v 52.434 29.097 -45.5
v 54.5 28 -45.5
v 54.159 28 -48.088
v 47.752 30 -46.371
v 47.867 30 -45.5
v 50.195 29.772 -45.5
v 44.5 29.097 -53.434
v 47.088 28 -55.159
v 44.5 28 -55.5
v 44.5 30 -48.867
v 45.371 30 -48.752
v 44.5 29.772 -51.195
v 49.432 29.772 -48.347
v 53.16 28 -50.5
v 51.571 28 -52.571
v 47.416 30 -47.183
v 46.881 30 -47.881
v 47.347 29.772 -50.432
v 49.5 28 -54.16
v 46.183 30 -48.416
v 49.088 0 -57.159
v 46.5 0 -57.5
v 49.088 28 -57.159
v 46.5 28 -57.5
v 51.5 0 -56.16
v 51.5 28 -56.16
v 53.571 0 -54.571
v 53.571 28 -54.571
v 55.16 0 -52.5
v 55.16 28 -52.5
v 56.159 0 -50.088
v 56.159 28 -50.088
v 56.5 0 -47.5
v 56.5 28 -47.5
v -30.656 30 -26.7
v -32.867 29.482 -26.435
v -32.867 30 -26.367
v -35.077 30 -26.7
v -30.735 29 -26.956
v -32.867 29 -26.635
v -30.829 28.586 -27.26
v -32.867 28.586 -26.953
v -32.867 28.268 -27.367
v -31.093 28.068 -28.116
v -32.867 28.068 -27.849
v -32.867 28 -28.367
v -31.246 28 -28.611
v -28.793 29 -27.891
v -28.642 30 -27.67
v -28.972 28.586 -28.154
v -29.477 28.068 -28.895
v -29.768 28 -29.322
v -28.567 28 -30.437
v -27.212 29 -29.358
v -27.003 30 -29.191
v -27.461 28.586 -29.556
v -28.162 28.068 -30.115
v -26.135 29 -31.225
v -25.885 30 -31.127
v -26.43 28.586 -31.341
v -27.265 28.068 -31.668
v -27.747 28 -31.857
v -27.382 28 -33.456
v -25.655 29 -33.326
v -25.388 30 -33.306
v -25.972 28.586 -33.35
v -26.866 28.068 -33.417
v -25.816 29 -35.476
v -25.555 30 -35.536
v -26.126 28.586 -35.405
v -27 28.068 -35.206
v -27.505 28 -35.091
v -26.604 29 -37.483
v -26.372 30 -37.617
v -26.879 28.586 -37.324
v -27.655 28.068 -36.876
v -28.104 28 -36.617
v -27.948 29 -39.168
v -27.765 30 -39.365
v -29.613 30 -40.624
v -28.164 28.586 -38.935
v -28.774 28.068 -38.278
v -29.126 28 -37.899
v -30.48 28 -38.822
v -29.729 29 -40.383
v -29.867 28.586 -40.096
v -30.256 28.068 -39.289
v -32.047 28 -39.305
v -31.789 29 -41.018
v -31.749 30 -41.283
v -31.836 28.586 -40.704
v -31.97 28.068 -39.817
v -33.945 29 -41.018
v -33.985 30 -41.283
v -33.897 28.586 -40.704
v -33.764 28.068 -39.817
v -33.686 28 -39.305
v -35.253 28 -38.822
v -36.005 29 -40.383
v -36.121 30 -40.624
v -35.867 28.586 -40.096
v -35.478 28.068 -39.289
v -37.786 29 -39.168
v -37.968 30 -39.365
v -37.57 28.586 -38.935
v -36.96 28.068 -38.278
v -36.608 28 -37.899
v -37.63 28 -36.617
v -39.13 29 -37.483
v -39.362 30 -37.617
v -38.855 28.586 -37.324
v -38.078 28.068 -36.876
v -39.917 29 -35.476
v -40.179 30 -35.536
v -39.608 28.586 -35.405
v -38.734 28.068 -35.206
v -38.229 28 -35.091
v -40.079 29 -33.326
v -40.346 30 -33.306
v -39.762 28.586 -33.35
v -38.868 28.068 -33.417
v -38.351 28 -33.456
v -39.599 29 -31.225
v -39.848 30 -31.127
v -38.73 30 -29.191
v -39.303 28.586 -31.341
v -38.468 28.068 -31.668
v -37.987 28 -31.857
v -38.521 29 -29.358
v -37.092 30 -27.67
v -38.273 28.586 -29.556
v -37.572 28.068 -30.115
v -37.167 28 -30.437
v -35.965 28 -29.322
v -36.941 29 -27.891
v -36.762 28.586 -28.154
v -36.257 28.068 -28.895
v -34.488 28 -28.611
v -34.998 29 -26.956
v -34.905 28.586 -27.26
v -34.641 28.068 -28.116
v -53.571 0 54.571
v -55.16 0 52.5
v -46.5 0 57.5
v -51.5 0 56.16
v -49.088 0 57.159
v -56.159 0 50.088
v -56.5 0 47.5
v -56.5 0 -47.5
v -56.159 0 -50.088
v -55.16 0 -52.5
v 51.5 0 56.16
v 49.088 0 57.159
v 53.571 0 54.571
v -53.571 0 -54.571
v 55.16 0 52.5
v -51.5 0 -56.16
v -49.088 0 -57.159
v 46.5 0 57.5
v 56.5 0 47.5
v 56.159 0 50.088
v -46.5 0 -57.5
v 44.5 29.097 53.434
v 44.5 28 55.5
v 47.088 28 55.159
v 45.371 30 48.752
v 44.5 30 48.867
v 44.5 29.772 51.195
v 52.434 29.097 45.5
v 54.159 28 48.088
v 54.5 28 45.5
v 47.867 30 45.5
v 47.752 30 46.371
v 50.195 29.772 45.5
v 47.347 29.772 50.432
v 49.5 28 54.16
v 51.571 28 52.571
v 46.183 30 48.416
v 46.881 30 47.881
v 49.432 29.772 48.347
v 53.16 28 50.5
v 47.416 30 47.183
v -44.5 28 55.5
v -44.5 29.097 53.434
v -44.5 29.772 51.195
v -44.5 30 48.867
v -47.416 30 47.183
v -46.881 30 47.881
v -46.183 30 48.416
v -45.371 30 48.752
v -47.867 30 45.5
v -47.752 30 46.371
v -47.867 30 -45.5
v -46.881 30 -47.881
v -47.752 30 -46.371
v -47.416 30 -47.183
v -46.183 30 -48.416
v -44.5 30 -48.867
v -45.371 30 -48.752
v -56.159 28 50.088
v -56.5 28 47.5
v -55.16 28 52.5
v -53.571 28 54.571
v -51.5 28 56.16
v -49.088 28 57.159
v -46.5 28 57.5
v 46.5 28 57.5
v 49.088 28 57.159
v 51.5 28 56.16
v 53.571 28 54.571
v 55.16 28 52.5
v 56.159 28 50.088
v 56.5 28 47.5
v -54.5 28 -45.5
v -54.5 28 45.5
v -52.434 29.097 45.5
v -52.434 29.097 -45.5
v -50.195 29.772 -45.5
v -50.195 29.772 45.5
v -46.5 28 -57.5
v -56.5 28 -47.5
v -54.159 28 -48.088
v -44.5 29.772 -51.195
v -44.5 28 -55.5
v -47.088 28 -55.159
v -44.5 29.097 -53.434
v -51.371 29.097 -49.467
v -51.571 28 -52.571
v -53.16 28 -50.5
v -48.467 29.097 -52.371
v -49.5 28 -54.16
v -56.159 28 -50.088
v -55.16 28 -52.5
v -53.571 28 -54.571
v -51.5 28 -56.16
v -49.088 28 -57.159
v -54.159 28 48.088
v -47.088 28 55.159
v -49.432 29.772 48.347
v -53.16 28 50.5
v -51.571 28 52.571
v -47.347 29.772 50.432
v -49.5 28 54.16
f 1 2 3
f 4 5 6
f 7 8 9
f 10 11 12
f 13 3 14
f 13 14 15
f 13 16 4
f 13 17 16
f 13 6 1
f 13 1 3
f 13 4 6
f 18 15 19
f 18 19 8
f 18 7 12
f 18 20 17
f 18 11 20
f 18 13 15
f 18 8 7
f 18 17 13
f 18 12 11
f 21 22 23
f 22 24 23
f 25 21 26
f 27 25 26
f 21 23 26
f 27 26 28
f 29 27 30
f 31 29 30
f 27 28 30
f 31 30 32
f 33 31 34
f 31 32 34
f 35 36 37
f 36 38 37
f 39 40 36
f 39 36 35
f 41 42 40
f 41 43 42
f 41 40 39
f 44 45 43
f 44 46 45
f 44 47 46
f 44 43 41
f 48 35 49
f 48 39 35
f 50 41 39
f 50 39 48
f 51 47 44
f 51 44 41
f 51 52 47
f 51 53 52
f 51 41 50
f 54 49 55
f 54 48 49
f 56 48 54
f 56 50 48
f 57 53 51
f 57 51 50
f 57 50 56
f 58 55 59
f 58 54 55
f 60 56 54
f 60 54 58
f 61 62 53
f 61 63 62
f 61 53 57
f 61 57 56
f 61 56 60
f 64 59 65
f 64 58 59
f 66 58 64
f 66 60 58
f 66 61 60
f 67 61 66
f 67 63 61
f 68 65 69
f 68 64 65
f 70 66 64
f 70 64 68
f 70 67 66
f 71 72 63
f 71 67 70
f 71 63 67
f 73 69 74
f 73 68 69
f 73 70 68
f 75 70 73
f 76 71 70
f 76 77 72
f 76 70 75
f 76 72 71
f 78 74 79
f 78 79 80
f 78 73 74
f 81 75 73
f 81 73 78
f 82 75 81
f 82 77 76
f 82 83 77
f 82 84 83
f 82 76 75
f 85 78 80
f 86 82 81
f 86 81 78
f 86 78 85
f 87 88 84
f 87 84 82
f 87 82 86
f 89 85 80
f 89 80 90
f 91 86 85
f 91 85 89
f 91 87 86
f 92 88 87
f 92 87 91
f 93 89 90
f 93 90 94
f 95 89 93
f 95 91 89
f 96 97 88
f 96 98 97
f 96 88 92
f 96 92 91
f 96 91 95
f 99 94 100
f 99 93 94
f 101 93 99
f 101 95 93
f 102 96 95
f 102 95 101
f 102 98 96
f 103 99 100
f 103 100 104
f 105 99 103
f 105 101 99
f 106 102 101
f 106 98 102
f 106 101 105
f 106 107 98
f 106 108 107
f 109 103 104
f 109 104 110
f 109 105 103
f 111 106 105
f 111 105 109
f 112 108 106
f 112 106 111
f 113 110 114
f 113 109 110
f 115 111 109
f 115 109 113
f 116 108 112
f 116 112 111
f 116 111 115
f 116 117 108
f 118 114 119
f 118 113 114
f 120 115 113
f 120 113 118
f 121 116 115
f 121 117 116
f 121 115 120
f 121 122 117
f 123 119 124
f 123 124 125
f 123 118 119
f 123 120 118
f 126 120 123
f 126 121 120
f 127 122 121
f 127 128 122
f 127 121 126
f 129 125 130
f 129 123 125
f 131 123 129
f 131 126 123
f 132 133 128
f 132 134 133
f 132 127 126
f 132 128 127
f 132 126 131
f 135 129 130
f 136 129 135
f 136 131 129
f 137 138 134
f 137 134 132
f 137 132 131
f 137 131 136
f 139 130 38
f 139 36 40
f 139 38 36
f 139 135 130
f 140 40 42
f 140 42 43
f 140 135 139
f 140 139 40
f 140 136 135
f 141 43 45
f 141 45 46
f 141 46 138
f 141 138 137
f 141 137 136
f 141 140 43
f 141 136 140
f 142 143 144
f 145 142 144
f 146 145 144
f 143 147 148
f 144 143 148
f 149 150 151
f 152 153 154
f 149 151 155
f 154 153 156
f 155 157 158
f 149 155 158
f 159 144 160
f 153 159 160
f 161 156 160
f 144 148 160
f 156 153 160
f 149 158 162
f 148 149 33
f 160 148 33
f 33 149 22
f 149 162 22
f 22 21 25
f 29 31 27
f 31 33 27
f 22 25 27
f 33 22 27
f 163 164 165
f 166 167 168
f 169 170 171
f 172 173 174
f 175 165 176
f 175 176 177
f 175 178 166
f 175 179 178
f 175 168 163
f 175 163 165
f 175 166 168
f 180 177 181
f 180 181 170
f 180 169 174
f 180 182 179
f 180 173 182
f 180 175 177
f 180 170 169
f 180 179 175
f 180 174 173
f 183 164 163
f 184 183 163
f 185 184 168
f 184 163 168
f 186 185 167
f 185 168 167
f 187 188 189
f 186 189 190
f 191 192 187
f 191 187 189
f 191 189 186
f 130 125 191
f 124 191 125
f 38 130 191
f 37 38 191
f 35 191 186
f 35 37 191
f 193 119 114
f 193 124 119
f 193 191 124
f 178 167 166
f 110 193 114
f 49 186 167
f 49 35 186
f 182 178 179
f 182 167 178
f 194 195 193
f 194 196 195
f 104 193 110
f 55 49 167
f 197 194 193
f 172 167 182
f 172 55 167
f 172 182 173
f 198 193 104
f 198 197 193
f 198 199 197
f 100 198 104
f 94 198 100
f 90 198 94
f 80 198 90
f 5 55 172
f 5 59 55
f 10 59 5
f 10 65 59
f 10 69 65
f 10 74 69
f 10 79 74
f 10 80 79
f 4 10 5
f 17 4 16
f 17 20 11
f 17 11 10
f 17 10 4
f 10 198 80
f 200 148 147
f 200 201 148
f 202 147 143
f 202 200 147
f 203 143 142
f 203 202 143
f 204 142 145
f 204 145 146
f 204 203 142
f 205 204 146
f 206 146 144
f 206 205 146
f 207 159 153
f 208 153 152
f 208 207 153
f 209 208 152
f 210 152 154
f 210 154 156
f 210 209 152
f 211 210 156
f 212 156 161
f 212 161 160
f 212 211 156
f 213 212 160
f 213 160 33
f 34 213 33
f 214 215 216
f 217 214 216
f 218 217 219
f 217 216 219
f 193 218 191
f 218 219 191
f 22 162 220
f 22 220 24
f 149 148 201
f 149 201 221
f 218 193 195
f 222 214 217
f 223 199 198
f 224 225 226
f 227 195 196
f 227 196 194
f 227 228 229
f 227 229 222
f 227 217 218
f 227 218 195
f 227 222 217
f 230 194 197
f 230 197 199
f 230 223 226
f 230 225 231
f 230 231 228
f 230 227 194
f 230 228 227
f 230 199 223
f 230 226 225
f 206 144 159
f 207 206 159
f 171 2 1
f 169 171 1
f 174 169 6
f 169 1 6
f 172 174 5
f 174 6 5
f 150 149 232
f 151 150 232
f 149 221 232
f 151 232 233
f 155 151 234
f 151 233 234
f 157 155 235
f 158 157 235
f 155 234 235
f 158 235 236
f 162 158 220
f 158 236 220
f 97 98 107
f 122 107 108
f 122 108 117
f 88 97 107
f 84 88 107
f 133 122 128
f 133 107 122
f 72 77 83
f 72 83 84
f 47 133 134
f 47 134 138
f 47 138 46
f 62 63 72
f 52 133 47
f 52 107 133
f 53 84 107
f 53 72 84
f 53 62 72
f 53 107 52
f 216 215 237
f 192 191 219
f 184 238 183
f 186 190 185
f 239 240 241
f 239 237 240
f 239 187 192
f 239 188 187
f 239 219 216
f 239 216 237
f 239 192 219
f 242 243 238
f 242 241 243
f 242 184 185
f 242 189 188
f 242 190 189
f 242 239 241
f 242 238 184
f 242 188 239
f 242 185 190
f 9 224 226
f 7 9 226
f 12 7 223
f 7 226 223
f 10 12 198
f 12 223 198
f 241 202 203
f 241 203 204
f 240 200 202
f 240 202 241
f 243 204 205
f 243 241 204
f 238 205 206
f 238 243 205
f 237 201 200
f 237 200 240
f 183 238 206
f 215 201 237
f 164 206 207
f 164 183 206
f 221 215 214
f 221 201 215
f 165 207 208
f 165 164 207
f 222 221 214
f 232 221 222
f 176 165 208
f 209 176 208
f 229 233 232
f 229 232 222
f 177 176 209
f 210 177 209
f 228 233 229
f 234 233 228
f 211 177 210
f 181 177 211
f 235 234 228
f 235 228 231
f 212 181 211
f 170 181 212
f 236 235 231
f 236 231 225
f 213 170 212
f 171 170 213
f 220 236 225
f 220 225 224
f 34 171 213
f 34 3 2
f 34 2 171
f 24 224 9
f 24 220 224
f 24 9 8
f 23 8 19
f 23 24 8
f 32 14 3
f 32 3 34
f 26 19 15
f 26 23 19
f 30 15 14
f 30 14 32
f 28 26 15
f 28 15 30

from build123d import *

# Parameters (mm, degrees)
ESBO_O1_W                = 113
ESBO_O1_H                = 115
RESSALTO_EXTRUS_O1_DEPTH = 30
ESBO_O2_W                = 113
ESBO_O2_H                = 115
ESBO_O2_W_2              = 109
ESBO_O2_H_2              = 111
CORTE_EXTRUS_O1_DEPTH    = 2
FILETE1_R                = 10
FILETE2_R                = 12
ESBO_O3_R                = 7.5
CORTE_EXTRUS_O2_DEPTH    = 2
FILETE3_R                = 2


# Some blends are built 0.0001 mm under size
with BuildPart() as part:
    # Esboço1 → Ressalto-extrusão1 (new body)
    with BuildSketch(Plane(origin=(0, 0, 0), x_dir=(1, 0, 0), z_dir=(0, 1, 0))):
        Rectangle(ESBO_O1_W, ESBO_O1_H)
    extrude(amount=RESSALTO_EXTRUS_O1_DEPTH)

    # Esboço2 → Corte-extrusão1 (cut)
    with BuildSketch(Plane(origin=(0, 30, 0), x_dir=(1, 0, 0), z_dir=(0, 1, 0))):
        Rectangle(ESBO_O2_W, ESBO_O2_H)
        Rectangle(ESBO_O2_W_2, ESBO_O2_H_2, mode=Mode.SUBTRACT)
    extrude(amount=-CORTE_EXTRUS_O1_DEPTH, mode=Mode.SUBTRACT)

    # Filete1
    filete1_edges = [part.edges().sort_by_distance(p)[0] for p in [
        (-56.5, 14, -57.5),
        (56.5, 14, -57.5),
        (56.5, 14, 57.5),
        (-56.5, 14, 57.5),
        (54.5, 29, 55.5),
        (-54.5, 29, 55.5),
        (-54.5, 29, -55.5),
        (54.5, 29, -55.5),
    ]]
    fillet(filete1_edges, radius=FILETE1_R)

    # Filete2
    # the kernel refuses this fillet: 12 mm, written as the material it takes off along each edge
    with BuildSketch(Plane(origin=(44.5, 30, 55.5), x_dir=(0, -1, 0), z_dir=(-1, 0, 0)), Plane(origin=(-44.5, 30, -55.5), x_dir=(0, -1, 0), z_dir=(1, 0, 0))) as filete2_piece_1:
        with BuildLine():
            CenterArc((12, -6.633249581), FILETE2_R, 146.442690238, 33.557309762)
            Line((0, -6.633249581), (-0.24, -6.633249581))
            Line((-0.24, -6.633249581), (-0.24, 0))
            Line((-0.24, 0), (0, 0.24))
            ThreePointArc((0, 0.24), (1, 0.24), (1.8, 0.132664992))
            Line((1.8, 0.132664992), (2, 0))
        make_face()
    extrude(amount=89, mode=Mode.SUBTRACT)
    with BuildSketch(Plane(origin=(-54.5, 30, 45.5), x_dir=(0, -1, 0), z_dir=(0, 0, -1)), Plane(origin=(54.5, 30, -45.5), x_dir=(0, -1, 0), z_dir=(0, 0, 1))) as filete2_piece_2:
        with BuildLine():
            CenterArc((12, -6.633249581), FILETE2_R, 146.442690238, 33.557309762)
            Line((0, -6.633249581), (-0.24, -6.633249581))
            Line((-0.24, -6.633249581), (-0.24, 0))
            Line((-0.24, 0), (0, 0.24))
            ThreePointArc((0, 0.24), (1, 0.24), (1.8, 0.132664992))
            Line((1.8, 0.132664992), (2, 0))
        make_face()
    extrude(amount=91, mode=Mode.SUBTRACT)
    with BuildSketch(Plane(origin=(44.5, 30, -45.5), x_dir=(1, 0, 0), z_dir=(0, 0, 1))) as filete2_piece_3:
        with BuildLine():
            CenterArc((3.366750419, -12), FILETE2_R, 56.442690238, 33.557309762)
            Line((3.366750419, 0), (3.366750419, 0.24))
            Line((3.366750419, 0.24), (10, 0.24))
            Line((10, 0.24), (10.24, 0))
            ThreePointArc((10.24, 0), (10.24, -1), (10.132664992, -1.8))
            Line((10.132664992, -1.8), (10, -2))
        make_face()
    revolve(axis=Axis((44.5, 30, -45.5), (0, 1, 0)), revolution_arc=90, mode=Mode.SUBTRACT)
    with BuildSketch(Plane(origin=(44.5, 30, 45.5), x_dir=(0, 0, 1), z_dir=(-1, 0, 0))) as filete2_piece_4:
        with BuildLine():
            CenterArc((3.366750419, -12), FILETE2_R, 56.442690238, 33.557309762)
            Line((3.366750419, 0), (3.366750419, 0.24))
            Line((3.366750419, 0.24), (10, 0.24))
            Line((10, 0.24), (10.24, 0))
            ThreePointArc((10.24, 0), (10.24, -1), (10.132664992, -1.8))
            Line((10.132664992, -1.8), (10, -2))
        make_face()
    revolve(axis=Axis((44.5, 30, 45.5), (0, 1, 0)), revolution_arc=90, mode=Mode.SUBTRACT)
    with BuildSketch(Plane(origin=(-44.5, 30, -45.5), x_dir=(-1, 0, 0), z_dir=(0, 0, 1))) as filete2_piece_5:
        with BuildLine():
            CenterArc((3.366750419, 12), FILETE2_R, 270, 33.557309762)
            Line((3.366750419, 0), (3.366750419, -0.24))
            Line((3.366750419, -0.24), (10, -0.24))
            Line((10, -0.24), (10.24, 0))
            ThreePointArc((10.24, 0), (10.24, 1), (10.132664992, 1.8))
            Line((10.132664992, 1.8), (10, 2))
        make_face()
    revolve(axis=Axis((-44.5, 30, -45.5), (0, -1, 0)), revolution_arc=90, mode=Mode.SUBTRACT)
    with BuildSketch(Plane(origin=(-44.5, 30, 45.5), x_dir=(-1, 0, 0), z_dir=(0, 0, -1))) as filete2_piece_6:
        with BuildLine():
            CenterArc((3.366750419, -12), FILETE2_R, 56.442690238, 33.557309762)
            Line((3.366750419, 0), (3.366750419, 0.24))
            Line((3.366750419, 0.24), (10, 0.24))
            Line((10, 0.24), (10.24, 0))
            ThreePointArc((10.24, 0), (10.24, -1), (10.132664992, -1.8))
            Line((10.132664992, -1.8), (10, -2))
        make_face()
    revolve(axis=Axis((-44.5, 30, 45.5), (0, 1, 0)), revolution_arc=90, mode=Mode.SUBTRACT)

    # Esboço3 → Corte-extrusão2 (cut)
    with BuildSketch(Plane(origin=(0, 30, 0), x_dir=(1, 0, 0), z_dir=(0, 1, 0))):
        with Locations(Location((-32.866750419, 33.866750419, 0), (0, 0, 270))):
            Circle(ESBO_O3_R)
    extrude(amount=-CORTE_EXTRUS_O2_DEPTH, mode=Mode.SUBTRACT)

    # Filete3
    filete3_edges = [part.edges().sort_by_distance(p)[0] for p in [
        (-32.866750419, 28, -41.366750419),
    ]]
    fillet(filete3_edges, radius=FILETE3_R - 0.0001)  # a hair under: the kernel refuses the full size


solid = part.part
